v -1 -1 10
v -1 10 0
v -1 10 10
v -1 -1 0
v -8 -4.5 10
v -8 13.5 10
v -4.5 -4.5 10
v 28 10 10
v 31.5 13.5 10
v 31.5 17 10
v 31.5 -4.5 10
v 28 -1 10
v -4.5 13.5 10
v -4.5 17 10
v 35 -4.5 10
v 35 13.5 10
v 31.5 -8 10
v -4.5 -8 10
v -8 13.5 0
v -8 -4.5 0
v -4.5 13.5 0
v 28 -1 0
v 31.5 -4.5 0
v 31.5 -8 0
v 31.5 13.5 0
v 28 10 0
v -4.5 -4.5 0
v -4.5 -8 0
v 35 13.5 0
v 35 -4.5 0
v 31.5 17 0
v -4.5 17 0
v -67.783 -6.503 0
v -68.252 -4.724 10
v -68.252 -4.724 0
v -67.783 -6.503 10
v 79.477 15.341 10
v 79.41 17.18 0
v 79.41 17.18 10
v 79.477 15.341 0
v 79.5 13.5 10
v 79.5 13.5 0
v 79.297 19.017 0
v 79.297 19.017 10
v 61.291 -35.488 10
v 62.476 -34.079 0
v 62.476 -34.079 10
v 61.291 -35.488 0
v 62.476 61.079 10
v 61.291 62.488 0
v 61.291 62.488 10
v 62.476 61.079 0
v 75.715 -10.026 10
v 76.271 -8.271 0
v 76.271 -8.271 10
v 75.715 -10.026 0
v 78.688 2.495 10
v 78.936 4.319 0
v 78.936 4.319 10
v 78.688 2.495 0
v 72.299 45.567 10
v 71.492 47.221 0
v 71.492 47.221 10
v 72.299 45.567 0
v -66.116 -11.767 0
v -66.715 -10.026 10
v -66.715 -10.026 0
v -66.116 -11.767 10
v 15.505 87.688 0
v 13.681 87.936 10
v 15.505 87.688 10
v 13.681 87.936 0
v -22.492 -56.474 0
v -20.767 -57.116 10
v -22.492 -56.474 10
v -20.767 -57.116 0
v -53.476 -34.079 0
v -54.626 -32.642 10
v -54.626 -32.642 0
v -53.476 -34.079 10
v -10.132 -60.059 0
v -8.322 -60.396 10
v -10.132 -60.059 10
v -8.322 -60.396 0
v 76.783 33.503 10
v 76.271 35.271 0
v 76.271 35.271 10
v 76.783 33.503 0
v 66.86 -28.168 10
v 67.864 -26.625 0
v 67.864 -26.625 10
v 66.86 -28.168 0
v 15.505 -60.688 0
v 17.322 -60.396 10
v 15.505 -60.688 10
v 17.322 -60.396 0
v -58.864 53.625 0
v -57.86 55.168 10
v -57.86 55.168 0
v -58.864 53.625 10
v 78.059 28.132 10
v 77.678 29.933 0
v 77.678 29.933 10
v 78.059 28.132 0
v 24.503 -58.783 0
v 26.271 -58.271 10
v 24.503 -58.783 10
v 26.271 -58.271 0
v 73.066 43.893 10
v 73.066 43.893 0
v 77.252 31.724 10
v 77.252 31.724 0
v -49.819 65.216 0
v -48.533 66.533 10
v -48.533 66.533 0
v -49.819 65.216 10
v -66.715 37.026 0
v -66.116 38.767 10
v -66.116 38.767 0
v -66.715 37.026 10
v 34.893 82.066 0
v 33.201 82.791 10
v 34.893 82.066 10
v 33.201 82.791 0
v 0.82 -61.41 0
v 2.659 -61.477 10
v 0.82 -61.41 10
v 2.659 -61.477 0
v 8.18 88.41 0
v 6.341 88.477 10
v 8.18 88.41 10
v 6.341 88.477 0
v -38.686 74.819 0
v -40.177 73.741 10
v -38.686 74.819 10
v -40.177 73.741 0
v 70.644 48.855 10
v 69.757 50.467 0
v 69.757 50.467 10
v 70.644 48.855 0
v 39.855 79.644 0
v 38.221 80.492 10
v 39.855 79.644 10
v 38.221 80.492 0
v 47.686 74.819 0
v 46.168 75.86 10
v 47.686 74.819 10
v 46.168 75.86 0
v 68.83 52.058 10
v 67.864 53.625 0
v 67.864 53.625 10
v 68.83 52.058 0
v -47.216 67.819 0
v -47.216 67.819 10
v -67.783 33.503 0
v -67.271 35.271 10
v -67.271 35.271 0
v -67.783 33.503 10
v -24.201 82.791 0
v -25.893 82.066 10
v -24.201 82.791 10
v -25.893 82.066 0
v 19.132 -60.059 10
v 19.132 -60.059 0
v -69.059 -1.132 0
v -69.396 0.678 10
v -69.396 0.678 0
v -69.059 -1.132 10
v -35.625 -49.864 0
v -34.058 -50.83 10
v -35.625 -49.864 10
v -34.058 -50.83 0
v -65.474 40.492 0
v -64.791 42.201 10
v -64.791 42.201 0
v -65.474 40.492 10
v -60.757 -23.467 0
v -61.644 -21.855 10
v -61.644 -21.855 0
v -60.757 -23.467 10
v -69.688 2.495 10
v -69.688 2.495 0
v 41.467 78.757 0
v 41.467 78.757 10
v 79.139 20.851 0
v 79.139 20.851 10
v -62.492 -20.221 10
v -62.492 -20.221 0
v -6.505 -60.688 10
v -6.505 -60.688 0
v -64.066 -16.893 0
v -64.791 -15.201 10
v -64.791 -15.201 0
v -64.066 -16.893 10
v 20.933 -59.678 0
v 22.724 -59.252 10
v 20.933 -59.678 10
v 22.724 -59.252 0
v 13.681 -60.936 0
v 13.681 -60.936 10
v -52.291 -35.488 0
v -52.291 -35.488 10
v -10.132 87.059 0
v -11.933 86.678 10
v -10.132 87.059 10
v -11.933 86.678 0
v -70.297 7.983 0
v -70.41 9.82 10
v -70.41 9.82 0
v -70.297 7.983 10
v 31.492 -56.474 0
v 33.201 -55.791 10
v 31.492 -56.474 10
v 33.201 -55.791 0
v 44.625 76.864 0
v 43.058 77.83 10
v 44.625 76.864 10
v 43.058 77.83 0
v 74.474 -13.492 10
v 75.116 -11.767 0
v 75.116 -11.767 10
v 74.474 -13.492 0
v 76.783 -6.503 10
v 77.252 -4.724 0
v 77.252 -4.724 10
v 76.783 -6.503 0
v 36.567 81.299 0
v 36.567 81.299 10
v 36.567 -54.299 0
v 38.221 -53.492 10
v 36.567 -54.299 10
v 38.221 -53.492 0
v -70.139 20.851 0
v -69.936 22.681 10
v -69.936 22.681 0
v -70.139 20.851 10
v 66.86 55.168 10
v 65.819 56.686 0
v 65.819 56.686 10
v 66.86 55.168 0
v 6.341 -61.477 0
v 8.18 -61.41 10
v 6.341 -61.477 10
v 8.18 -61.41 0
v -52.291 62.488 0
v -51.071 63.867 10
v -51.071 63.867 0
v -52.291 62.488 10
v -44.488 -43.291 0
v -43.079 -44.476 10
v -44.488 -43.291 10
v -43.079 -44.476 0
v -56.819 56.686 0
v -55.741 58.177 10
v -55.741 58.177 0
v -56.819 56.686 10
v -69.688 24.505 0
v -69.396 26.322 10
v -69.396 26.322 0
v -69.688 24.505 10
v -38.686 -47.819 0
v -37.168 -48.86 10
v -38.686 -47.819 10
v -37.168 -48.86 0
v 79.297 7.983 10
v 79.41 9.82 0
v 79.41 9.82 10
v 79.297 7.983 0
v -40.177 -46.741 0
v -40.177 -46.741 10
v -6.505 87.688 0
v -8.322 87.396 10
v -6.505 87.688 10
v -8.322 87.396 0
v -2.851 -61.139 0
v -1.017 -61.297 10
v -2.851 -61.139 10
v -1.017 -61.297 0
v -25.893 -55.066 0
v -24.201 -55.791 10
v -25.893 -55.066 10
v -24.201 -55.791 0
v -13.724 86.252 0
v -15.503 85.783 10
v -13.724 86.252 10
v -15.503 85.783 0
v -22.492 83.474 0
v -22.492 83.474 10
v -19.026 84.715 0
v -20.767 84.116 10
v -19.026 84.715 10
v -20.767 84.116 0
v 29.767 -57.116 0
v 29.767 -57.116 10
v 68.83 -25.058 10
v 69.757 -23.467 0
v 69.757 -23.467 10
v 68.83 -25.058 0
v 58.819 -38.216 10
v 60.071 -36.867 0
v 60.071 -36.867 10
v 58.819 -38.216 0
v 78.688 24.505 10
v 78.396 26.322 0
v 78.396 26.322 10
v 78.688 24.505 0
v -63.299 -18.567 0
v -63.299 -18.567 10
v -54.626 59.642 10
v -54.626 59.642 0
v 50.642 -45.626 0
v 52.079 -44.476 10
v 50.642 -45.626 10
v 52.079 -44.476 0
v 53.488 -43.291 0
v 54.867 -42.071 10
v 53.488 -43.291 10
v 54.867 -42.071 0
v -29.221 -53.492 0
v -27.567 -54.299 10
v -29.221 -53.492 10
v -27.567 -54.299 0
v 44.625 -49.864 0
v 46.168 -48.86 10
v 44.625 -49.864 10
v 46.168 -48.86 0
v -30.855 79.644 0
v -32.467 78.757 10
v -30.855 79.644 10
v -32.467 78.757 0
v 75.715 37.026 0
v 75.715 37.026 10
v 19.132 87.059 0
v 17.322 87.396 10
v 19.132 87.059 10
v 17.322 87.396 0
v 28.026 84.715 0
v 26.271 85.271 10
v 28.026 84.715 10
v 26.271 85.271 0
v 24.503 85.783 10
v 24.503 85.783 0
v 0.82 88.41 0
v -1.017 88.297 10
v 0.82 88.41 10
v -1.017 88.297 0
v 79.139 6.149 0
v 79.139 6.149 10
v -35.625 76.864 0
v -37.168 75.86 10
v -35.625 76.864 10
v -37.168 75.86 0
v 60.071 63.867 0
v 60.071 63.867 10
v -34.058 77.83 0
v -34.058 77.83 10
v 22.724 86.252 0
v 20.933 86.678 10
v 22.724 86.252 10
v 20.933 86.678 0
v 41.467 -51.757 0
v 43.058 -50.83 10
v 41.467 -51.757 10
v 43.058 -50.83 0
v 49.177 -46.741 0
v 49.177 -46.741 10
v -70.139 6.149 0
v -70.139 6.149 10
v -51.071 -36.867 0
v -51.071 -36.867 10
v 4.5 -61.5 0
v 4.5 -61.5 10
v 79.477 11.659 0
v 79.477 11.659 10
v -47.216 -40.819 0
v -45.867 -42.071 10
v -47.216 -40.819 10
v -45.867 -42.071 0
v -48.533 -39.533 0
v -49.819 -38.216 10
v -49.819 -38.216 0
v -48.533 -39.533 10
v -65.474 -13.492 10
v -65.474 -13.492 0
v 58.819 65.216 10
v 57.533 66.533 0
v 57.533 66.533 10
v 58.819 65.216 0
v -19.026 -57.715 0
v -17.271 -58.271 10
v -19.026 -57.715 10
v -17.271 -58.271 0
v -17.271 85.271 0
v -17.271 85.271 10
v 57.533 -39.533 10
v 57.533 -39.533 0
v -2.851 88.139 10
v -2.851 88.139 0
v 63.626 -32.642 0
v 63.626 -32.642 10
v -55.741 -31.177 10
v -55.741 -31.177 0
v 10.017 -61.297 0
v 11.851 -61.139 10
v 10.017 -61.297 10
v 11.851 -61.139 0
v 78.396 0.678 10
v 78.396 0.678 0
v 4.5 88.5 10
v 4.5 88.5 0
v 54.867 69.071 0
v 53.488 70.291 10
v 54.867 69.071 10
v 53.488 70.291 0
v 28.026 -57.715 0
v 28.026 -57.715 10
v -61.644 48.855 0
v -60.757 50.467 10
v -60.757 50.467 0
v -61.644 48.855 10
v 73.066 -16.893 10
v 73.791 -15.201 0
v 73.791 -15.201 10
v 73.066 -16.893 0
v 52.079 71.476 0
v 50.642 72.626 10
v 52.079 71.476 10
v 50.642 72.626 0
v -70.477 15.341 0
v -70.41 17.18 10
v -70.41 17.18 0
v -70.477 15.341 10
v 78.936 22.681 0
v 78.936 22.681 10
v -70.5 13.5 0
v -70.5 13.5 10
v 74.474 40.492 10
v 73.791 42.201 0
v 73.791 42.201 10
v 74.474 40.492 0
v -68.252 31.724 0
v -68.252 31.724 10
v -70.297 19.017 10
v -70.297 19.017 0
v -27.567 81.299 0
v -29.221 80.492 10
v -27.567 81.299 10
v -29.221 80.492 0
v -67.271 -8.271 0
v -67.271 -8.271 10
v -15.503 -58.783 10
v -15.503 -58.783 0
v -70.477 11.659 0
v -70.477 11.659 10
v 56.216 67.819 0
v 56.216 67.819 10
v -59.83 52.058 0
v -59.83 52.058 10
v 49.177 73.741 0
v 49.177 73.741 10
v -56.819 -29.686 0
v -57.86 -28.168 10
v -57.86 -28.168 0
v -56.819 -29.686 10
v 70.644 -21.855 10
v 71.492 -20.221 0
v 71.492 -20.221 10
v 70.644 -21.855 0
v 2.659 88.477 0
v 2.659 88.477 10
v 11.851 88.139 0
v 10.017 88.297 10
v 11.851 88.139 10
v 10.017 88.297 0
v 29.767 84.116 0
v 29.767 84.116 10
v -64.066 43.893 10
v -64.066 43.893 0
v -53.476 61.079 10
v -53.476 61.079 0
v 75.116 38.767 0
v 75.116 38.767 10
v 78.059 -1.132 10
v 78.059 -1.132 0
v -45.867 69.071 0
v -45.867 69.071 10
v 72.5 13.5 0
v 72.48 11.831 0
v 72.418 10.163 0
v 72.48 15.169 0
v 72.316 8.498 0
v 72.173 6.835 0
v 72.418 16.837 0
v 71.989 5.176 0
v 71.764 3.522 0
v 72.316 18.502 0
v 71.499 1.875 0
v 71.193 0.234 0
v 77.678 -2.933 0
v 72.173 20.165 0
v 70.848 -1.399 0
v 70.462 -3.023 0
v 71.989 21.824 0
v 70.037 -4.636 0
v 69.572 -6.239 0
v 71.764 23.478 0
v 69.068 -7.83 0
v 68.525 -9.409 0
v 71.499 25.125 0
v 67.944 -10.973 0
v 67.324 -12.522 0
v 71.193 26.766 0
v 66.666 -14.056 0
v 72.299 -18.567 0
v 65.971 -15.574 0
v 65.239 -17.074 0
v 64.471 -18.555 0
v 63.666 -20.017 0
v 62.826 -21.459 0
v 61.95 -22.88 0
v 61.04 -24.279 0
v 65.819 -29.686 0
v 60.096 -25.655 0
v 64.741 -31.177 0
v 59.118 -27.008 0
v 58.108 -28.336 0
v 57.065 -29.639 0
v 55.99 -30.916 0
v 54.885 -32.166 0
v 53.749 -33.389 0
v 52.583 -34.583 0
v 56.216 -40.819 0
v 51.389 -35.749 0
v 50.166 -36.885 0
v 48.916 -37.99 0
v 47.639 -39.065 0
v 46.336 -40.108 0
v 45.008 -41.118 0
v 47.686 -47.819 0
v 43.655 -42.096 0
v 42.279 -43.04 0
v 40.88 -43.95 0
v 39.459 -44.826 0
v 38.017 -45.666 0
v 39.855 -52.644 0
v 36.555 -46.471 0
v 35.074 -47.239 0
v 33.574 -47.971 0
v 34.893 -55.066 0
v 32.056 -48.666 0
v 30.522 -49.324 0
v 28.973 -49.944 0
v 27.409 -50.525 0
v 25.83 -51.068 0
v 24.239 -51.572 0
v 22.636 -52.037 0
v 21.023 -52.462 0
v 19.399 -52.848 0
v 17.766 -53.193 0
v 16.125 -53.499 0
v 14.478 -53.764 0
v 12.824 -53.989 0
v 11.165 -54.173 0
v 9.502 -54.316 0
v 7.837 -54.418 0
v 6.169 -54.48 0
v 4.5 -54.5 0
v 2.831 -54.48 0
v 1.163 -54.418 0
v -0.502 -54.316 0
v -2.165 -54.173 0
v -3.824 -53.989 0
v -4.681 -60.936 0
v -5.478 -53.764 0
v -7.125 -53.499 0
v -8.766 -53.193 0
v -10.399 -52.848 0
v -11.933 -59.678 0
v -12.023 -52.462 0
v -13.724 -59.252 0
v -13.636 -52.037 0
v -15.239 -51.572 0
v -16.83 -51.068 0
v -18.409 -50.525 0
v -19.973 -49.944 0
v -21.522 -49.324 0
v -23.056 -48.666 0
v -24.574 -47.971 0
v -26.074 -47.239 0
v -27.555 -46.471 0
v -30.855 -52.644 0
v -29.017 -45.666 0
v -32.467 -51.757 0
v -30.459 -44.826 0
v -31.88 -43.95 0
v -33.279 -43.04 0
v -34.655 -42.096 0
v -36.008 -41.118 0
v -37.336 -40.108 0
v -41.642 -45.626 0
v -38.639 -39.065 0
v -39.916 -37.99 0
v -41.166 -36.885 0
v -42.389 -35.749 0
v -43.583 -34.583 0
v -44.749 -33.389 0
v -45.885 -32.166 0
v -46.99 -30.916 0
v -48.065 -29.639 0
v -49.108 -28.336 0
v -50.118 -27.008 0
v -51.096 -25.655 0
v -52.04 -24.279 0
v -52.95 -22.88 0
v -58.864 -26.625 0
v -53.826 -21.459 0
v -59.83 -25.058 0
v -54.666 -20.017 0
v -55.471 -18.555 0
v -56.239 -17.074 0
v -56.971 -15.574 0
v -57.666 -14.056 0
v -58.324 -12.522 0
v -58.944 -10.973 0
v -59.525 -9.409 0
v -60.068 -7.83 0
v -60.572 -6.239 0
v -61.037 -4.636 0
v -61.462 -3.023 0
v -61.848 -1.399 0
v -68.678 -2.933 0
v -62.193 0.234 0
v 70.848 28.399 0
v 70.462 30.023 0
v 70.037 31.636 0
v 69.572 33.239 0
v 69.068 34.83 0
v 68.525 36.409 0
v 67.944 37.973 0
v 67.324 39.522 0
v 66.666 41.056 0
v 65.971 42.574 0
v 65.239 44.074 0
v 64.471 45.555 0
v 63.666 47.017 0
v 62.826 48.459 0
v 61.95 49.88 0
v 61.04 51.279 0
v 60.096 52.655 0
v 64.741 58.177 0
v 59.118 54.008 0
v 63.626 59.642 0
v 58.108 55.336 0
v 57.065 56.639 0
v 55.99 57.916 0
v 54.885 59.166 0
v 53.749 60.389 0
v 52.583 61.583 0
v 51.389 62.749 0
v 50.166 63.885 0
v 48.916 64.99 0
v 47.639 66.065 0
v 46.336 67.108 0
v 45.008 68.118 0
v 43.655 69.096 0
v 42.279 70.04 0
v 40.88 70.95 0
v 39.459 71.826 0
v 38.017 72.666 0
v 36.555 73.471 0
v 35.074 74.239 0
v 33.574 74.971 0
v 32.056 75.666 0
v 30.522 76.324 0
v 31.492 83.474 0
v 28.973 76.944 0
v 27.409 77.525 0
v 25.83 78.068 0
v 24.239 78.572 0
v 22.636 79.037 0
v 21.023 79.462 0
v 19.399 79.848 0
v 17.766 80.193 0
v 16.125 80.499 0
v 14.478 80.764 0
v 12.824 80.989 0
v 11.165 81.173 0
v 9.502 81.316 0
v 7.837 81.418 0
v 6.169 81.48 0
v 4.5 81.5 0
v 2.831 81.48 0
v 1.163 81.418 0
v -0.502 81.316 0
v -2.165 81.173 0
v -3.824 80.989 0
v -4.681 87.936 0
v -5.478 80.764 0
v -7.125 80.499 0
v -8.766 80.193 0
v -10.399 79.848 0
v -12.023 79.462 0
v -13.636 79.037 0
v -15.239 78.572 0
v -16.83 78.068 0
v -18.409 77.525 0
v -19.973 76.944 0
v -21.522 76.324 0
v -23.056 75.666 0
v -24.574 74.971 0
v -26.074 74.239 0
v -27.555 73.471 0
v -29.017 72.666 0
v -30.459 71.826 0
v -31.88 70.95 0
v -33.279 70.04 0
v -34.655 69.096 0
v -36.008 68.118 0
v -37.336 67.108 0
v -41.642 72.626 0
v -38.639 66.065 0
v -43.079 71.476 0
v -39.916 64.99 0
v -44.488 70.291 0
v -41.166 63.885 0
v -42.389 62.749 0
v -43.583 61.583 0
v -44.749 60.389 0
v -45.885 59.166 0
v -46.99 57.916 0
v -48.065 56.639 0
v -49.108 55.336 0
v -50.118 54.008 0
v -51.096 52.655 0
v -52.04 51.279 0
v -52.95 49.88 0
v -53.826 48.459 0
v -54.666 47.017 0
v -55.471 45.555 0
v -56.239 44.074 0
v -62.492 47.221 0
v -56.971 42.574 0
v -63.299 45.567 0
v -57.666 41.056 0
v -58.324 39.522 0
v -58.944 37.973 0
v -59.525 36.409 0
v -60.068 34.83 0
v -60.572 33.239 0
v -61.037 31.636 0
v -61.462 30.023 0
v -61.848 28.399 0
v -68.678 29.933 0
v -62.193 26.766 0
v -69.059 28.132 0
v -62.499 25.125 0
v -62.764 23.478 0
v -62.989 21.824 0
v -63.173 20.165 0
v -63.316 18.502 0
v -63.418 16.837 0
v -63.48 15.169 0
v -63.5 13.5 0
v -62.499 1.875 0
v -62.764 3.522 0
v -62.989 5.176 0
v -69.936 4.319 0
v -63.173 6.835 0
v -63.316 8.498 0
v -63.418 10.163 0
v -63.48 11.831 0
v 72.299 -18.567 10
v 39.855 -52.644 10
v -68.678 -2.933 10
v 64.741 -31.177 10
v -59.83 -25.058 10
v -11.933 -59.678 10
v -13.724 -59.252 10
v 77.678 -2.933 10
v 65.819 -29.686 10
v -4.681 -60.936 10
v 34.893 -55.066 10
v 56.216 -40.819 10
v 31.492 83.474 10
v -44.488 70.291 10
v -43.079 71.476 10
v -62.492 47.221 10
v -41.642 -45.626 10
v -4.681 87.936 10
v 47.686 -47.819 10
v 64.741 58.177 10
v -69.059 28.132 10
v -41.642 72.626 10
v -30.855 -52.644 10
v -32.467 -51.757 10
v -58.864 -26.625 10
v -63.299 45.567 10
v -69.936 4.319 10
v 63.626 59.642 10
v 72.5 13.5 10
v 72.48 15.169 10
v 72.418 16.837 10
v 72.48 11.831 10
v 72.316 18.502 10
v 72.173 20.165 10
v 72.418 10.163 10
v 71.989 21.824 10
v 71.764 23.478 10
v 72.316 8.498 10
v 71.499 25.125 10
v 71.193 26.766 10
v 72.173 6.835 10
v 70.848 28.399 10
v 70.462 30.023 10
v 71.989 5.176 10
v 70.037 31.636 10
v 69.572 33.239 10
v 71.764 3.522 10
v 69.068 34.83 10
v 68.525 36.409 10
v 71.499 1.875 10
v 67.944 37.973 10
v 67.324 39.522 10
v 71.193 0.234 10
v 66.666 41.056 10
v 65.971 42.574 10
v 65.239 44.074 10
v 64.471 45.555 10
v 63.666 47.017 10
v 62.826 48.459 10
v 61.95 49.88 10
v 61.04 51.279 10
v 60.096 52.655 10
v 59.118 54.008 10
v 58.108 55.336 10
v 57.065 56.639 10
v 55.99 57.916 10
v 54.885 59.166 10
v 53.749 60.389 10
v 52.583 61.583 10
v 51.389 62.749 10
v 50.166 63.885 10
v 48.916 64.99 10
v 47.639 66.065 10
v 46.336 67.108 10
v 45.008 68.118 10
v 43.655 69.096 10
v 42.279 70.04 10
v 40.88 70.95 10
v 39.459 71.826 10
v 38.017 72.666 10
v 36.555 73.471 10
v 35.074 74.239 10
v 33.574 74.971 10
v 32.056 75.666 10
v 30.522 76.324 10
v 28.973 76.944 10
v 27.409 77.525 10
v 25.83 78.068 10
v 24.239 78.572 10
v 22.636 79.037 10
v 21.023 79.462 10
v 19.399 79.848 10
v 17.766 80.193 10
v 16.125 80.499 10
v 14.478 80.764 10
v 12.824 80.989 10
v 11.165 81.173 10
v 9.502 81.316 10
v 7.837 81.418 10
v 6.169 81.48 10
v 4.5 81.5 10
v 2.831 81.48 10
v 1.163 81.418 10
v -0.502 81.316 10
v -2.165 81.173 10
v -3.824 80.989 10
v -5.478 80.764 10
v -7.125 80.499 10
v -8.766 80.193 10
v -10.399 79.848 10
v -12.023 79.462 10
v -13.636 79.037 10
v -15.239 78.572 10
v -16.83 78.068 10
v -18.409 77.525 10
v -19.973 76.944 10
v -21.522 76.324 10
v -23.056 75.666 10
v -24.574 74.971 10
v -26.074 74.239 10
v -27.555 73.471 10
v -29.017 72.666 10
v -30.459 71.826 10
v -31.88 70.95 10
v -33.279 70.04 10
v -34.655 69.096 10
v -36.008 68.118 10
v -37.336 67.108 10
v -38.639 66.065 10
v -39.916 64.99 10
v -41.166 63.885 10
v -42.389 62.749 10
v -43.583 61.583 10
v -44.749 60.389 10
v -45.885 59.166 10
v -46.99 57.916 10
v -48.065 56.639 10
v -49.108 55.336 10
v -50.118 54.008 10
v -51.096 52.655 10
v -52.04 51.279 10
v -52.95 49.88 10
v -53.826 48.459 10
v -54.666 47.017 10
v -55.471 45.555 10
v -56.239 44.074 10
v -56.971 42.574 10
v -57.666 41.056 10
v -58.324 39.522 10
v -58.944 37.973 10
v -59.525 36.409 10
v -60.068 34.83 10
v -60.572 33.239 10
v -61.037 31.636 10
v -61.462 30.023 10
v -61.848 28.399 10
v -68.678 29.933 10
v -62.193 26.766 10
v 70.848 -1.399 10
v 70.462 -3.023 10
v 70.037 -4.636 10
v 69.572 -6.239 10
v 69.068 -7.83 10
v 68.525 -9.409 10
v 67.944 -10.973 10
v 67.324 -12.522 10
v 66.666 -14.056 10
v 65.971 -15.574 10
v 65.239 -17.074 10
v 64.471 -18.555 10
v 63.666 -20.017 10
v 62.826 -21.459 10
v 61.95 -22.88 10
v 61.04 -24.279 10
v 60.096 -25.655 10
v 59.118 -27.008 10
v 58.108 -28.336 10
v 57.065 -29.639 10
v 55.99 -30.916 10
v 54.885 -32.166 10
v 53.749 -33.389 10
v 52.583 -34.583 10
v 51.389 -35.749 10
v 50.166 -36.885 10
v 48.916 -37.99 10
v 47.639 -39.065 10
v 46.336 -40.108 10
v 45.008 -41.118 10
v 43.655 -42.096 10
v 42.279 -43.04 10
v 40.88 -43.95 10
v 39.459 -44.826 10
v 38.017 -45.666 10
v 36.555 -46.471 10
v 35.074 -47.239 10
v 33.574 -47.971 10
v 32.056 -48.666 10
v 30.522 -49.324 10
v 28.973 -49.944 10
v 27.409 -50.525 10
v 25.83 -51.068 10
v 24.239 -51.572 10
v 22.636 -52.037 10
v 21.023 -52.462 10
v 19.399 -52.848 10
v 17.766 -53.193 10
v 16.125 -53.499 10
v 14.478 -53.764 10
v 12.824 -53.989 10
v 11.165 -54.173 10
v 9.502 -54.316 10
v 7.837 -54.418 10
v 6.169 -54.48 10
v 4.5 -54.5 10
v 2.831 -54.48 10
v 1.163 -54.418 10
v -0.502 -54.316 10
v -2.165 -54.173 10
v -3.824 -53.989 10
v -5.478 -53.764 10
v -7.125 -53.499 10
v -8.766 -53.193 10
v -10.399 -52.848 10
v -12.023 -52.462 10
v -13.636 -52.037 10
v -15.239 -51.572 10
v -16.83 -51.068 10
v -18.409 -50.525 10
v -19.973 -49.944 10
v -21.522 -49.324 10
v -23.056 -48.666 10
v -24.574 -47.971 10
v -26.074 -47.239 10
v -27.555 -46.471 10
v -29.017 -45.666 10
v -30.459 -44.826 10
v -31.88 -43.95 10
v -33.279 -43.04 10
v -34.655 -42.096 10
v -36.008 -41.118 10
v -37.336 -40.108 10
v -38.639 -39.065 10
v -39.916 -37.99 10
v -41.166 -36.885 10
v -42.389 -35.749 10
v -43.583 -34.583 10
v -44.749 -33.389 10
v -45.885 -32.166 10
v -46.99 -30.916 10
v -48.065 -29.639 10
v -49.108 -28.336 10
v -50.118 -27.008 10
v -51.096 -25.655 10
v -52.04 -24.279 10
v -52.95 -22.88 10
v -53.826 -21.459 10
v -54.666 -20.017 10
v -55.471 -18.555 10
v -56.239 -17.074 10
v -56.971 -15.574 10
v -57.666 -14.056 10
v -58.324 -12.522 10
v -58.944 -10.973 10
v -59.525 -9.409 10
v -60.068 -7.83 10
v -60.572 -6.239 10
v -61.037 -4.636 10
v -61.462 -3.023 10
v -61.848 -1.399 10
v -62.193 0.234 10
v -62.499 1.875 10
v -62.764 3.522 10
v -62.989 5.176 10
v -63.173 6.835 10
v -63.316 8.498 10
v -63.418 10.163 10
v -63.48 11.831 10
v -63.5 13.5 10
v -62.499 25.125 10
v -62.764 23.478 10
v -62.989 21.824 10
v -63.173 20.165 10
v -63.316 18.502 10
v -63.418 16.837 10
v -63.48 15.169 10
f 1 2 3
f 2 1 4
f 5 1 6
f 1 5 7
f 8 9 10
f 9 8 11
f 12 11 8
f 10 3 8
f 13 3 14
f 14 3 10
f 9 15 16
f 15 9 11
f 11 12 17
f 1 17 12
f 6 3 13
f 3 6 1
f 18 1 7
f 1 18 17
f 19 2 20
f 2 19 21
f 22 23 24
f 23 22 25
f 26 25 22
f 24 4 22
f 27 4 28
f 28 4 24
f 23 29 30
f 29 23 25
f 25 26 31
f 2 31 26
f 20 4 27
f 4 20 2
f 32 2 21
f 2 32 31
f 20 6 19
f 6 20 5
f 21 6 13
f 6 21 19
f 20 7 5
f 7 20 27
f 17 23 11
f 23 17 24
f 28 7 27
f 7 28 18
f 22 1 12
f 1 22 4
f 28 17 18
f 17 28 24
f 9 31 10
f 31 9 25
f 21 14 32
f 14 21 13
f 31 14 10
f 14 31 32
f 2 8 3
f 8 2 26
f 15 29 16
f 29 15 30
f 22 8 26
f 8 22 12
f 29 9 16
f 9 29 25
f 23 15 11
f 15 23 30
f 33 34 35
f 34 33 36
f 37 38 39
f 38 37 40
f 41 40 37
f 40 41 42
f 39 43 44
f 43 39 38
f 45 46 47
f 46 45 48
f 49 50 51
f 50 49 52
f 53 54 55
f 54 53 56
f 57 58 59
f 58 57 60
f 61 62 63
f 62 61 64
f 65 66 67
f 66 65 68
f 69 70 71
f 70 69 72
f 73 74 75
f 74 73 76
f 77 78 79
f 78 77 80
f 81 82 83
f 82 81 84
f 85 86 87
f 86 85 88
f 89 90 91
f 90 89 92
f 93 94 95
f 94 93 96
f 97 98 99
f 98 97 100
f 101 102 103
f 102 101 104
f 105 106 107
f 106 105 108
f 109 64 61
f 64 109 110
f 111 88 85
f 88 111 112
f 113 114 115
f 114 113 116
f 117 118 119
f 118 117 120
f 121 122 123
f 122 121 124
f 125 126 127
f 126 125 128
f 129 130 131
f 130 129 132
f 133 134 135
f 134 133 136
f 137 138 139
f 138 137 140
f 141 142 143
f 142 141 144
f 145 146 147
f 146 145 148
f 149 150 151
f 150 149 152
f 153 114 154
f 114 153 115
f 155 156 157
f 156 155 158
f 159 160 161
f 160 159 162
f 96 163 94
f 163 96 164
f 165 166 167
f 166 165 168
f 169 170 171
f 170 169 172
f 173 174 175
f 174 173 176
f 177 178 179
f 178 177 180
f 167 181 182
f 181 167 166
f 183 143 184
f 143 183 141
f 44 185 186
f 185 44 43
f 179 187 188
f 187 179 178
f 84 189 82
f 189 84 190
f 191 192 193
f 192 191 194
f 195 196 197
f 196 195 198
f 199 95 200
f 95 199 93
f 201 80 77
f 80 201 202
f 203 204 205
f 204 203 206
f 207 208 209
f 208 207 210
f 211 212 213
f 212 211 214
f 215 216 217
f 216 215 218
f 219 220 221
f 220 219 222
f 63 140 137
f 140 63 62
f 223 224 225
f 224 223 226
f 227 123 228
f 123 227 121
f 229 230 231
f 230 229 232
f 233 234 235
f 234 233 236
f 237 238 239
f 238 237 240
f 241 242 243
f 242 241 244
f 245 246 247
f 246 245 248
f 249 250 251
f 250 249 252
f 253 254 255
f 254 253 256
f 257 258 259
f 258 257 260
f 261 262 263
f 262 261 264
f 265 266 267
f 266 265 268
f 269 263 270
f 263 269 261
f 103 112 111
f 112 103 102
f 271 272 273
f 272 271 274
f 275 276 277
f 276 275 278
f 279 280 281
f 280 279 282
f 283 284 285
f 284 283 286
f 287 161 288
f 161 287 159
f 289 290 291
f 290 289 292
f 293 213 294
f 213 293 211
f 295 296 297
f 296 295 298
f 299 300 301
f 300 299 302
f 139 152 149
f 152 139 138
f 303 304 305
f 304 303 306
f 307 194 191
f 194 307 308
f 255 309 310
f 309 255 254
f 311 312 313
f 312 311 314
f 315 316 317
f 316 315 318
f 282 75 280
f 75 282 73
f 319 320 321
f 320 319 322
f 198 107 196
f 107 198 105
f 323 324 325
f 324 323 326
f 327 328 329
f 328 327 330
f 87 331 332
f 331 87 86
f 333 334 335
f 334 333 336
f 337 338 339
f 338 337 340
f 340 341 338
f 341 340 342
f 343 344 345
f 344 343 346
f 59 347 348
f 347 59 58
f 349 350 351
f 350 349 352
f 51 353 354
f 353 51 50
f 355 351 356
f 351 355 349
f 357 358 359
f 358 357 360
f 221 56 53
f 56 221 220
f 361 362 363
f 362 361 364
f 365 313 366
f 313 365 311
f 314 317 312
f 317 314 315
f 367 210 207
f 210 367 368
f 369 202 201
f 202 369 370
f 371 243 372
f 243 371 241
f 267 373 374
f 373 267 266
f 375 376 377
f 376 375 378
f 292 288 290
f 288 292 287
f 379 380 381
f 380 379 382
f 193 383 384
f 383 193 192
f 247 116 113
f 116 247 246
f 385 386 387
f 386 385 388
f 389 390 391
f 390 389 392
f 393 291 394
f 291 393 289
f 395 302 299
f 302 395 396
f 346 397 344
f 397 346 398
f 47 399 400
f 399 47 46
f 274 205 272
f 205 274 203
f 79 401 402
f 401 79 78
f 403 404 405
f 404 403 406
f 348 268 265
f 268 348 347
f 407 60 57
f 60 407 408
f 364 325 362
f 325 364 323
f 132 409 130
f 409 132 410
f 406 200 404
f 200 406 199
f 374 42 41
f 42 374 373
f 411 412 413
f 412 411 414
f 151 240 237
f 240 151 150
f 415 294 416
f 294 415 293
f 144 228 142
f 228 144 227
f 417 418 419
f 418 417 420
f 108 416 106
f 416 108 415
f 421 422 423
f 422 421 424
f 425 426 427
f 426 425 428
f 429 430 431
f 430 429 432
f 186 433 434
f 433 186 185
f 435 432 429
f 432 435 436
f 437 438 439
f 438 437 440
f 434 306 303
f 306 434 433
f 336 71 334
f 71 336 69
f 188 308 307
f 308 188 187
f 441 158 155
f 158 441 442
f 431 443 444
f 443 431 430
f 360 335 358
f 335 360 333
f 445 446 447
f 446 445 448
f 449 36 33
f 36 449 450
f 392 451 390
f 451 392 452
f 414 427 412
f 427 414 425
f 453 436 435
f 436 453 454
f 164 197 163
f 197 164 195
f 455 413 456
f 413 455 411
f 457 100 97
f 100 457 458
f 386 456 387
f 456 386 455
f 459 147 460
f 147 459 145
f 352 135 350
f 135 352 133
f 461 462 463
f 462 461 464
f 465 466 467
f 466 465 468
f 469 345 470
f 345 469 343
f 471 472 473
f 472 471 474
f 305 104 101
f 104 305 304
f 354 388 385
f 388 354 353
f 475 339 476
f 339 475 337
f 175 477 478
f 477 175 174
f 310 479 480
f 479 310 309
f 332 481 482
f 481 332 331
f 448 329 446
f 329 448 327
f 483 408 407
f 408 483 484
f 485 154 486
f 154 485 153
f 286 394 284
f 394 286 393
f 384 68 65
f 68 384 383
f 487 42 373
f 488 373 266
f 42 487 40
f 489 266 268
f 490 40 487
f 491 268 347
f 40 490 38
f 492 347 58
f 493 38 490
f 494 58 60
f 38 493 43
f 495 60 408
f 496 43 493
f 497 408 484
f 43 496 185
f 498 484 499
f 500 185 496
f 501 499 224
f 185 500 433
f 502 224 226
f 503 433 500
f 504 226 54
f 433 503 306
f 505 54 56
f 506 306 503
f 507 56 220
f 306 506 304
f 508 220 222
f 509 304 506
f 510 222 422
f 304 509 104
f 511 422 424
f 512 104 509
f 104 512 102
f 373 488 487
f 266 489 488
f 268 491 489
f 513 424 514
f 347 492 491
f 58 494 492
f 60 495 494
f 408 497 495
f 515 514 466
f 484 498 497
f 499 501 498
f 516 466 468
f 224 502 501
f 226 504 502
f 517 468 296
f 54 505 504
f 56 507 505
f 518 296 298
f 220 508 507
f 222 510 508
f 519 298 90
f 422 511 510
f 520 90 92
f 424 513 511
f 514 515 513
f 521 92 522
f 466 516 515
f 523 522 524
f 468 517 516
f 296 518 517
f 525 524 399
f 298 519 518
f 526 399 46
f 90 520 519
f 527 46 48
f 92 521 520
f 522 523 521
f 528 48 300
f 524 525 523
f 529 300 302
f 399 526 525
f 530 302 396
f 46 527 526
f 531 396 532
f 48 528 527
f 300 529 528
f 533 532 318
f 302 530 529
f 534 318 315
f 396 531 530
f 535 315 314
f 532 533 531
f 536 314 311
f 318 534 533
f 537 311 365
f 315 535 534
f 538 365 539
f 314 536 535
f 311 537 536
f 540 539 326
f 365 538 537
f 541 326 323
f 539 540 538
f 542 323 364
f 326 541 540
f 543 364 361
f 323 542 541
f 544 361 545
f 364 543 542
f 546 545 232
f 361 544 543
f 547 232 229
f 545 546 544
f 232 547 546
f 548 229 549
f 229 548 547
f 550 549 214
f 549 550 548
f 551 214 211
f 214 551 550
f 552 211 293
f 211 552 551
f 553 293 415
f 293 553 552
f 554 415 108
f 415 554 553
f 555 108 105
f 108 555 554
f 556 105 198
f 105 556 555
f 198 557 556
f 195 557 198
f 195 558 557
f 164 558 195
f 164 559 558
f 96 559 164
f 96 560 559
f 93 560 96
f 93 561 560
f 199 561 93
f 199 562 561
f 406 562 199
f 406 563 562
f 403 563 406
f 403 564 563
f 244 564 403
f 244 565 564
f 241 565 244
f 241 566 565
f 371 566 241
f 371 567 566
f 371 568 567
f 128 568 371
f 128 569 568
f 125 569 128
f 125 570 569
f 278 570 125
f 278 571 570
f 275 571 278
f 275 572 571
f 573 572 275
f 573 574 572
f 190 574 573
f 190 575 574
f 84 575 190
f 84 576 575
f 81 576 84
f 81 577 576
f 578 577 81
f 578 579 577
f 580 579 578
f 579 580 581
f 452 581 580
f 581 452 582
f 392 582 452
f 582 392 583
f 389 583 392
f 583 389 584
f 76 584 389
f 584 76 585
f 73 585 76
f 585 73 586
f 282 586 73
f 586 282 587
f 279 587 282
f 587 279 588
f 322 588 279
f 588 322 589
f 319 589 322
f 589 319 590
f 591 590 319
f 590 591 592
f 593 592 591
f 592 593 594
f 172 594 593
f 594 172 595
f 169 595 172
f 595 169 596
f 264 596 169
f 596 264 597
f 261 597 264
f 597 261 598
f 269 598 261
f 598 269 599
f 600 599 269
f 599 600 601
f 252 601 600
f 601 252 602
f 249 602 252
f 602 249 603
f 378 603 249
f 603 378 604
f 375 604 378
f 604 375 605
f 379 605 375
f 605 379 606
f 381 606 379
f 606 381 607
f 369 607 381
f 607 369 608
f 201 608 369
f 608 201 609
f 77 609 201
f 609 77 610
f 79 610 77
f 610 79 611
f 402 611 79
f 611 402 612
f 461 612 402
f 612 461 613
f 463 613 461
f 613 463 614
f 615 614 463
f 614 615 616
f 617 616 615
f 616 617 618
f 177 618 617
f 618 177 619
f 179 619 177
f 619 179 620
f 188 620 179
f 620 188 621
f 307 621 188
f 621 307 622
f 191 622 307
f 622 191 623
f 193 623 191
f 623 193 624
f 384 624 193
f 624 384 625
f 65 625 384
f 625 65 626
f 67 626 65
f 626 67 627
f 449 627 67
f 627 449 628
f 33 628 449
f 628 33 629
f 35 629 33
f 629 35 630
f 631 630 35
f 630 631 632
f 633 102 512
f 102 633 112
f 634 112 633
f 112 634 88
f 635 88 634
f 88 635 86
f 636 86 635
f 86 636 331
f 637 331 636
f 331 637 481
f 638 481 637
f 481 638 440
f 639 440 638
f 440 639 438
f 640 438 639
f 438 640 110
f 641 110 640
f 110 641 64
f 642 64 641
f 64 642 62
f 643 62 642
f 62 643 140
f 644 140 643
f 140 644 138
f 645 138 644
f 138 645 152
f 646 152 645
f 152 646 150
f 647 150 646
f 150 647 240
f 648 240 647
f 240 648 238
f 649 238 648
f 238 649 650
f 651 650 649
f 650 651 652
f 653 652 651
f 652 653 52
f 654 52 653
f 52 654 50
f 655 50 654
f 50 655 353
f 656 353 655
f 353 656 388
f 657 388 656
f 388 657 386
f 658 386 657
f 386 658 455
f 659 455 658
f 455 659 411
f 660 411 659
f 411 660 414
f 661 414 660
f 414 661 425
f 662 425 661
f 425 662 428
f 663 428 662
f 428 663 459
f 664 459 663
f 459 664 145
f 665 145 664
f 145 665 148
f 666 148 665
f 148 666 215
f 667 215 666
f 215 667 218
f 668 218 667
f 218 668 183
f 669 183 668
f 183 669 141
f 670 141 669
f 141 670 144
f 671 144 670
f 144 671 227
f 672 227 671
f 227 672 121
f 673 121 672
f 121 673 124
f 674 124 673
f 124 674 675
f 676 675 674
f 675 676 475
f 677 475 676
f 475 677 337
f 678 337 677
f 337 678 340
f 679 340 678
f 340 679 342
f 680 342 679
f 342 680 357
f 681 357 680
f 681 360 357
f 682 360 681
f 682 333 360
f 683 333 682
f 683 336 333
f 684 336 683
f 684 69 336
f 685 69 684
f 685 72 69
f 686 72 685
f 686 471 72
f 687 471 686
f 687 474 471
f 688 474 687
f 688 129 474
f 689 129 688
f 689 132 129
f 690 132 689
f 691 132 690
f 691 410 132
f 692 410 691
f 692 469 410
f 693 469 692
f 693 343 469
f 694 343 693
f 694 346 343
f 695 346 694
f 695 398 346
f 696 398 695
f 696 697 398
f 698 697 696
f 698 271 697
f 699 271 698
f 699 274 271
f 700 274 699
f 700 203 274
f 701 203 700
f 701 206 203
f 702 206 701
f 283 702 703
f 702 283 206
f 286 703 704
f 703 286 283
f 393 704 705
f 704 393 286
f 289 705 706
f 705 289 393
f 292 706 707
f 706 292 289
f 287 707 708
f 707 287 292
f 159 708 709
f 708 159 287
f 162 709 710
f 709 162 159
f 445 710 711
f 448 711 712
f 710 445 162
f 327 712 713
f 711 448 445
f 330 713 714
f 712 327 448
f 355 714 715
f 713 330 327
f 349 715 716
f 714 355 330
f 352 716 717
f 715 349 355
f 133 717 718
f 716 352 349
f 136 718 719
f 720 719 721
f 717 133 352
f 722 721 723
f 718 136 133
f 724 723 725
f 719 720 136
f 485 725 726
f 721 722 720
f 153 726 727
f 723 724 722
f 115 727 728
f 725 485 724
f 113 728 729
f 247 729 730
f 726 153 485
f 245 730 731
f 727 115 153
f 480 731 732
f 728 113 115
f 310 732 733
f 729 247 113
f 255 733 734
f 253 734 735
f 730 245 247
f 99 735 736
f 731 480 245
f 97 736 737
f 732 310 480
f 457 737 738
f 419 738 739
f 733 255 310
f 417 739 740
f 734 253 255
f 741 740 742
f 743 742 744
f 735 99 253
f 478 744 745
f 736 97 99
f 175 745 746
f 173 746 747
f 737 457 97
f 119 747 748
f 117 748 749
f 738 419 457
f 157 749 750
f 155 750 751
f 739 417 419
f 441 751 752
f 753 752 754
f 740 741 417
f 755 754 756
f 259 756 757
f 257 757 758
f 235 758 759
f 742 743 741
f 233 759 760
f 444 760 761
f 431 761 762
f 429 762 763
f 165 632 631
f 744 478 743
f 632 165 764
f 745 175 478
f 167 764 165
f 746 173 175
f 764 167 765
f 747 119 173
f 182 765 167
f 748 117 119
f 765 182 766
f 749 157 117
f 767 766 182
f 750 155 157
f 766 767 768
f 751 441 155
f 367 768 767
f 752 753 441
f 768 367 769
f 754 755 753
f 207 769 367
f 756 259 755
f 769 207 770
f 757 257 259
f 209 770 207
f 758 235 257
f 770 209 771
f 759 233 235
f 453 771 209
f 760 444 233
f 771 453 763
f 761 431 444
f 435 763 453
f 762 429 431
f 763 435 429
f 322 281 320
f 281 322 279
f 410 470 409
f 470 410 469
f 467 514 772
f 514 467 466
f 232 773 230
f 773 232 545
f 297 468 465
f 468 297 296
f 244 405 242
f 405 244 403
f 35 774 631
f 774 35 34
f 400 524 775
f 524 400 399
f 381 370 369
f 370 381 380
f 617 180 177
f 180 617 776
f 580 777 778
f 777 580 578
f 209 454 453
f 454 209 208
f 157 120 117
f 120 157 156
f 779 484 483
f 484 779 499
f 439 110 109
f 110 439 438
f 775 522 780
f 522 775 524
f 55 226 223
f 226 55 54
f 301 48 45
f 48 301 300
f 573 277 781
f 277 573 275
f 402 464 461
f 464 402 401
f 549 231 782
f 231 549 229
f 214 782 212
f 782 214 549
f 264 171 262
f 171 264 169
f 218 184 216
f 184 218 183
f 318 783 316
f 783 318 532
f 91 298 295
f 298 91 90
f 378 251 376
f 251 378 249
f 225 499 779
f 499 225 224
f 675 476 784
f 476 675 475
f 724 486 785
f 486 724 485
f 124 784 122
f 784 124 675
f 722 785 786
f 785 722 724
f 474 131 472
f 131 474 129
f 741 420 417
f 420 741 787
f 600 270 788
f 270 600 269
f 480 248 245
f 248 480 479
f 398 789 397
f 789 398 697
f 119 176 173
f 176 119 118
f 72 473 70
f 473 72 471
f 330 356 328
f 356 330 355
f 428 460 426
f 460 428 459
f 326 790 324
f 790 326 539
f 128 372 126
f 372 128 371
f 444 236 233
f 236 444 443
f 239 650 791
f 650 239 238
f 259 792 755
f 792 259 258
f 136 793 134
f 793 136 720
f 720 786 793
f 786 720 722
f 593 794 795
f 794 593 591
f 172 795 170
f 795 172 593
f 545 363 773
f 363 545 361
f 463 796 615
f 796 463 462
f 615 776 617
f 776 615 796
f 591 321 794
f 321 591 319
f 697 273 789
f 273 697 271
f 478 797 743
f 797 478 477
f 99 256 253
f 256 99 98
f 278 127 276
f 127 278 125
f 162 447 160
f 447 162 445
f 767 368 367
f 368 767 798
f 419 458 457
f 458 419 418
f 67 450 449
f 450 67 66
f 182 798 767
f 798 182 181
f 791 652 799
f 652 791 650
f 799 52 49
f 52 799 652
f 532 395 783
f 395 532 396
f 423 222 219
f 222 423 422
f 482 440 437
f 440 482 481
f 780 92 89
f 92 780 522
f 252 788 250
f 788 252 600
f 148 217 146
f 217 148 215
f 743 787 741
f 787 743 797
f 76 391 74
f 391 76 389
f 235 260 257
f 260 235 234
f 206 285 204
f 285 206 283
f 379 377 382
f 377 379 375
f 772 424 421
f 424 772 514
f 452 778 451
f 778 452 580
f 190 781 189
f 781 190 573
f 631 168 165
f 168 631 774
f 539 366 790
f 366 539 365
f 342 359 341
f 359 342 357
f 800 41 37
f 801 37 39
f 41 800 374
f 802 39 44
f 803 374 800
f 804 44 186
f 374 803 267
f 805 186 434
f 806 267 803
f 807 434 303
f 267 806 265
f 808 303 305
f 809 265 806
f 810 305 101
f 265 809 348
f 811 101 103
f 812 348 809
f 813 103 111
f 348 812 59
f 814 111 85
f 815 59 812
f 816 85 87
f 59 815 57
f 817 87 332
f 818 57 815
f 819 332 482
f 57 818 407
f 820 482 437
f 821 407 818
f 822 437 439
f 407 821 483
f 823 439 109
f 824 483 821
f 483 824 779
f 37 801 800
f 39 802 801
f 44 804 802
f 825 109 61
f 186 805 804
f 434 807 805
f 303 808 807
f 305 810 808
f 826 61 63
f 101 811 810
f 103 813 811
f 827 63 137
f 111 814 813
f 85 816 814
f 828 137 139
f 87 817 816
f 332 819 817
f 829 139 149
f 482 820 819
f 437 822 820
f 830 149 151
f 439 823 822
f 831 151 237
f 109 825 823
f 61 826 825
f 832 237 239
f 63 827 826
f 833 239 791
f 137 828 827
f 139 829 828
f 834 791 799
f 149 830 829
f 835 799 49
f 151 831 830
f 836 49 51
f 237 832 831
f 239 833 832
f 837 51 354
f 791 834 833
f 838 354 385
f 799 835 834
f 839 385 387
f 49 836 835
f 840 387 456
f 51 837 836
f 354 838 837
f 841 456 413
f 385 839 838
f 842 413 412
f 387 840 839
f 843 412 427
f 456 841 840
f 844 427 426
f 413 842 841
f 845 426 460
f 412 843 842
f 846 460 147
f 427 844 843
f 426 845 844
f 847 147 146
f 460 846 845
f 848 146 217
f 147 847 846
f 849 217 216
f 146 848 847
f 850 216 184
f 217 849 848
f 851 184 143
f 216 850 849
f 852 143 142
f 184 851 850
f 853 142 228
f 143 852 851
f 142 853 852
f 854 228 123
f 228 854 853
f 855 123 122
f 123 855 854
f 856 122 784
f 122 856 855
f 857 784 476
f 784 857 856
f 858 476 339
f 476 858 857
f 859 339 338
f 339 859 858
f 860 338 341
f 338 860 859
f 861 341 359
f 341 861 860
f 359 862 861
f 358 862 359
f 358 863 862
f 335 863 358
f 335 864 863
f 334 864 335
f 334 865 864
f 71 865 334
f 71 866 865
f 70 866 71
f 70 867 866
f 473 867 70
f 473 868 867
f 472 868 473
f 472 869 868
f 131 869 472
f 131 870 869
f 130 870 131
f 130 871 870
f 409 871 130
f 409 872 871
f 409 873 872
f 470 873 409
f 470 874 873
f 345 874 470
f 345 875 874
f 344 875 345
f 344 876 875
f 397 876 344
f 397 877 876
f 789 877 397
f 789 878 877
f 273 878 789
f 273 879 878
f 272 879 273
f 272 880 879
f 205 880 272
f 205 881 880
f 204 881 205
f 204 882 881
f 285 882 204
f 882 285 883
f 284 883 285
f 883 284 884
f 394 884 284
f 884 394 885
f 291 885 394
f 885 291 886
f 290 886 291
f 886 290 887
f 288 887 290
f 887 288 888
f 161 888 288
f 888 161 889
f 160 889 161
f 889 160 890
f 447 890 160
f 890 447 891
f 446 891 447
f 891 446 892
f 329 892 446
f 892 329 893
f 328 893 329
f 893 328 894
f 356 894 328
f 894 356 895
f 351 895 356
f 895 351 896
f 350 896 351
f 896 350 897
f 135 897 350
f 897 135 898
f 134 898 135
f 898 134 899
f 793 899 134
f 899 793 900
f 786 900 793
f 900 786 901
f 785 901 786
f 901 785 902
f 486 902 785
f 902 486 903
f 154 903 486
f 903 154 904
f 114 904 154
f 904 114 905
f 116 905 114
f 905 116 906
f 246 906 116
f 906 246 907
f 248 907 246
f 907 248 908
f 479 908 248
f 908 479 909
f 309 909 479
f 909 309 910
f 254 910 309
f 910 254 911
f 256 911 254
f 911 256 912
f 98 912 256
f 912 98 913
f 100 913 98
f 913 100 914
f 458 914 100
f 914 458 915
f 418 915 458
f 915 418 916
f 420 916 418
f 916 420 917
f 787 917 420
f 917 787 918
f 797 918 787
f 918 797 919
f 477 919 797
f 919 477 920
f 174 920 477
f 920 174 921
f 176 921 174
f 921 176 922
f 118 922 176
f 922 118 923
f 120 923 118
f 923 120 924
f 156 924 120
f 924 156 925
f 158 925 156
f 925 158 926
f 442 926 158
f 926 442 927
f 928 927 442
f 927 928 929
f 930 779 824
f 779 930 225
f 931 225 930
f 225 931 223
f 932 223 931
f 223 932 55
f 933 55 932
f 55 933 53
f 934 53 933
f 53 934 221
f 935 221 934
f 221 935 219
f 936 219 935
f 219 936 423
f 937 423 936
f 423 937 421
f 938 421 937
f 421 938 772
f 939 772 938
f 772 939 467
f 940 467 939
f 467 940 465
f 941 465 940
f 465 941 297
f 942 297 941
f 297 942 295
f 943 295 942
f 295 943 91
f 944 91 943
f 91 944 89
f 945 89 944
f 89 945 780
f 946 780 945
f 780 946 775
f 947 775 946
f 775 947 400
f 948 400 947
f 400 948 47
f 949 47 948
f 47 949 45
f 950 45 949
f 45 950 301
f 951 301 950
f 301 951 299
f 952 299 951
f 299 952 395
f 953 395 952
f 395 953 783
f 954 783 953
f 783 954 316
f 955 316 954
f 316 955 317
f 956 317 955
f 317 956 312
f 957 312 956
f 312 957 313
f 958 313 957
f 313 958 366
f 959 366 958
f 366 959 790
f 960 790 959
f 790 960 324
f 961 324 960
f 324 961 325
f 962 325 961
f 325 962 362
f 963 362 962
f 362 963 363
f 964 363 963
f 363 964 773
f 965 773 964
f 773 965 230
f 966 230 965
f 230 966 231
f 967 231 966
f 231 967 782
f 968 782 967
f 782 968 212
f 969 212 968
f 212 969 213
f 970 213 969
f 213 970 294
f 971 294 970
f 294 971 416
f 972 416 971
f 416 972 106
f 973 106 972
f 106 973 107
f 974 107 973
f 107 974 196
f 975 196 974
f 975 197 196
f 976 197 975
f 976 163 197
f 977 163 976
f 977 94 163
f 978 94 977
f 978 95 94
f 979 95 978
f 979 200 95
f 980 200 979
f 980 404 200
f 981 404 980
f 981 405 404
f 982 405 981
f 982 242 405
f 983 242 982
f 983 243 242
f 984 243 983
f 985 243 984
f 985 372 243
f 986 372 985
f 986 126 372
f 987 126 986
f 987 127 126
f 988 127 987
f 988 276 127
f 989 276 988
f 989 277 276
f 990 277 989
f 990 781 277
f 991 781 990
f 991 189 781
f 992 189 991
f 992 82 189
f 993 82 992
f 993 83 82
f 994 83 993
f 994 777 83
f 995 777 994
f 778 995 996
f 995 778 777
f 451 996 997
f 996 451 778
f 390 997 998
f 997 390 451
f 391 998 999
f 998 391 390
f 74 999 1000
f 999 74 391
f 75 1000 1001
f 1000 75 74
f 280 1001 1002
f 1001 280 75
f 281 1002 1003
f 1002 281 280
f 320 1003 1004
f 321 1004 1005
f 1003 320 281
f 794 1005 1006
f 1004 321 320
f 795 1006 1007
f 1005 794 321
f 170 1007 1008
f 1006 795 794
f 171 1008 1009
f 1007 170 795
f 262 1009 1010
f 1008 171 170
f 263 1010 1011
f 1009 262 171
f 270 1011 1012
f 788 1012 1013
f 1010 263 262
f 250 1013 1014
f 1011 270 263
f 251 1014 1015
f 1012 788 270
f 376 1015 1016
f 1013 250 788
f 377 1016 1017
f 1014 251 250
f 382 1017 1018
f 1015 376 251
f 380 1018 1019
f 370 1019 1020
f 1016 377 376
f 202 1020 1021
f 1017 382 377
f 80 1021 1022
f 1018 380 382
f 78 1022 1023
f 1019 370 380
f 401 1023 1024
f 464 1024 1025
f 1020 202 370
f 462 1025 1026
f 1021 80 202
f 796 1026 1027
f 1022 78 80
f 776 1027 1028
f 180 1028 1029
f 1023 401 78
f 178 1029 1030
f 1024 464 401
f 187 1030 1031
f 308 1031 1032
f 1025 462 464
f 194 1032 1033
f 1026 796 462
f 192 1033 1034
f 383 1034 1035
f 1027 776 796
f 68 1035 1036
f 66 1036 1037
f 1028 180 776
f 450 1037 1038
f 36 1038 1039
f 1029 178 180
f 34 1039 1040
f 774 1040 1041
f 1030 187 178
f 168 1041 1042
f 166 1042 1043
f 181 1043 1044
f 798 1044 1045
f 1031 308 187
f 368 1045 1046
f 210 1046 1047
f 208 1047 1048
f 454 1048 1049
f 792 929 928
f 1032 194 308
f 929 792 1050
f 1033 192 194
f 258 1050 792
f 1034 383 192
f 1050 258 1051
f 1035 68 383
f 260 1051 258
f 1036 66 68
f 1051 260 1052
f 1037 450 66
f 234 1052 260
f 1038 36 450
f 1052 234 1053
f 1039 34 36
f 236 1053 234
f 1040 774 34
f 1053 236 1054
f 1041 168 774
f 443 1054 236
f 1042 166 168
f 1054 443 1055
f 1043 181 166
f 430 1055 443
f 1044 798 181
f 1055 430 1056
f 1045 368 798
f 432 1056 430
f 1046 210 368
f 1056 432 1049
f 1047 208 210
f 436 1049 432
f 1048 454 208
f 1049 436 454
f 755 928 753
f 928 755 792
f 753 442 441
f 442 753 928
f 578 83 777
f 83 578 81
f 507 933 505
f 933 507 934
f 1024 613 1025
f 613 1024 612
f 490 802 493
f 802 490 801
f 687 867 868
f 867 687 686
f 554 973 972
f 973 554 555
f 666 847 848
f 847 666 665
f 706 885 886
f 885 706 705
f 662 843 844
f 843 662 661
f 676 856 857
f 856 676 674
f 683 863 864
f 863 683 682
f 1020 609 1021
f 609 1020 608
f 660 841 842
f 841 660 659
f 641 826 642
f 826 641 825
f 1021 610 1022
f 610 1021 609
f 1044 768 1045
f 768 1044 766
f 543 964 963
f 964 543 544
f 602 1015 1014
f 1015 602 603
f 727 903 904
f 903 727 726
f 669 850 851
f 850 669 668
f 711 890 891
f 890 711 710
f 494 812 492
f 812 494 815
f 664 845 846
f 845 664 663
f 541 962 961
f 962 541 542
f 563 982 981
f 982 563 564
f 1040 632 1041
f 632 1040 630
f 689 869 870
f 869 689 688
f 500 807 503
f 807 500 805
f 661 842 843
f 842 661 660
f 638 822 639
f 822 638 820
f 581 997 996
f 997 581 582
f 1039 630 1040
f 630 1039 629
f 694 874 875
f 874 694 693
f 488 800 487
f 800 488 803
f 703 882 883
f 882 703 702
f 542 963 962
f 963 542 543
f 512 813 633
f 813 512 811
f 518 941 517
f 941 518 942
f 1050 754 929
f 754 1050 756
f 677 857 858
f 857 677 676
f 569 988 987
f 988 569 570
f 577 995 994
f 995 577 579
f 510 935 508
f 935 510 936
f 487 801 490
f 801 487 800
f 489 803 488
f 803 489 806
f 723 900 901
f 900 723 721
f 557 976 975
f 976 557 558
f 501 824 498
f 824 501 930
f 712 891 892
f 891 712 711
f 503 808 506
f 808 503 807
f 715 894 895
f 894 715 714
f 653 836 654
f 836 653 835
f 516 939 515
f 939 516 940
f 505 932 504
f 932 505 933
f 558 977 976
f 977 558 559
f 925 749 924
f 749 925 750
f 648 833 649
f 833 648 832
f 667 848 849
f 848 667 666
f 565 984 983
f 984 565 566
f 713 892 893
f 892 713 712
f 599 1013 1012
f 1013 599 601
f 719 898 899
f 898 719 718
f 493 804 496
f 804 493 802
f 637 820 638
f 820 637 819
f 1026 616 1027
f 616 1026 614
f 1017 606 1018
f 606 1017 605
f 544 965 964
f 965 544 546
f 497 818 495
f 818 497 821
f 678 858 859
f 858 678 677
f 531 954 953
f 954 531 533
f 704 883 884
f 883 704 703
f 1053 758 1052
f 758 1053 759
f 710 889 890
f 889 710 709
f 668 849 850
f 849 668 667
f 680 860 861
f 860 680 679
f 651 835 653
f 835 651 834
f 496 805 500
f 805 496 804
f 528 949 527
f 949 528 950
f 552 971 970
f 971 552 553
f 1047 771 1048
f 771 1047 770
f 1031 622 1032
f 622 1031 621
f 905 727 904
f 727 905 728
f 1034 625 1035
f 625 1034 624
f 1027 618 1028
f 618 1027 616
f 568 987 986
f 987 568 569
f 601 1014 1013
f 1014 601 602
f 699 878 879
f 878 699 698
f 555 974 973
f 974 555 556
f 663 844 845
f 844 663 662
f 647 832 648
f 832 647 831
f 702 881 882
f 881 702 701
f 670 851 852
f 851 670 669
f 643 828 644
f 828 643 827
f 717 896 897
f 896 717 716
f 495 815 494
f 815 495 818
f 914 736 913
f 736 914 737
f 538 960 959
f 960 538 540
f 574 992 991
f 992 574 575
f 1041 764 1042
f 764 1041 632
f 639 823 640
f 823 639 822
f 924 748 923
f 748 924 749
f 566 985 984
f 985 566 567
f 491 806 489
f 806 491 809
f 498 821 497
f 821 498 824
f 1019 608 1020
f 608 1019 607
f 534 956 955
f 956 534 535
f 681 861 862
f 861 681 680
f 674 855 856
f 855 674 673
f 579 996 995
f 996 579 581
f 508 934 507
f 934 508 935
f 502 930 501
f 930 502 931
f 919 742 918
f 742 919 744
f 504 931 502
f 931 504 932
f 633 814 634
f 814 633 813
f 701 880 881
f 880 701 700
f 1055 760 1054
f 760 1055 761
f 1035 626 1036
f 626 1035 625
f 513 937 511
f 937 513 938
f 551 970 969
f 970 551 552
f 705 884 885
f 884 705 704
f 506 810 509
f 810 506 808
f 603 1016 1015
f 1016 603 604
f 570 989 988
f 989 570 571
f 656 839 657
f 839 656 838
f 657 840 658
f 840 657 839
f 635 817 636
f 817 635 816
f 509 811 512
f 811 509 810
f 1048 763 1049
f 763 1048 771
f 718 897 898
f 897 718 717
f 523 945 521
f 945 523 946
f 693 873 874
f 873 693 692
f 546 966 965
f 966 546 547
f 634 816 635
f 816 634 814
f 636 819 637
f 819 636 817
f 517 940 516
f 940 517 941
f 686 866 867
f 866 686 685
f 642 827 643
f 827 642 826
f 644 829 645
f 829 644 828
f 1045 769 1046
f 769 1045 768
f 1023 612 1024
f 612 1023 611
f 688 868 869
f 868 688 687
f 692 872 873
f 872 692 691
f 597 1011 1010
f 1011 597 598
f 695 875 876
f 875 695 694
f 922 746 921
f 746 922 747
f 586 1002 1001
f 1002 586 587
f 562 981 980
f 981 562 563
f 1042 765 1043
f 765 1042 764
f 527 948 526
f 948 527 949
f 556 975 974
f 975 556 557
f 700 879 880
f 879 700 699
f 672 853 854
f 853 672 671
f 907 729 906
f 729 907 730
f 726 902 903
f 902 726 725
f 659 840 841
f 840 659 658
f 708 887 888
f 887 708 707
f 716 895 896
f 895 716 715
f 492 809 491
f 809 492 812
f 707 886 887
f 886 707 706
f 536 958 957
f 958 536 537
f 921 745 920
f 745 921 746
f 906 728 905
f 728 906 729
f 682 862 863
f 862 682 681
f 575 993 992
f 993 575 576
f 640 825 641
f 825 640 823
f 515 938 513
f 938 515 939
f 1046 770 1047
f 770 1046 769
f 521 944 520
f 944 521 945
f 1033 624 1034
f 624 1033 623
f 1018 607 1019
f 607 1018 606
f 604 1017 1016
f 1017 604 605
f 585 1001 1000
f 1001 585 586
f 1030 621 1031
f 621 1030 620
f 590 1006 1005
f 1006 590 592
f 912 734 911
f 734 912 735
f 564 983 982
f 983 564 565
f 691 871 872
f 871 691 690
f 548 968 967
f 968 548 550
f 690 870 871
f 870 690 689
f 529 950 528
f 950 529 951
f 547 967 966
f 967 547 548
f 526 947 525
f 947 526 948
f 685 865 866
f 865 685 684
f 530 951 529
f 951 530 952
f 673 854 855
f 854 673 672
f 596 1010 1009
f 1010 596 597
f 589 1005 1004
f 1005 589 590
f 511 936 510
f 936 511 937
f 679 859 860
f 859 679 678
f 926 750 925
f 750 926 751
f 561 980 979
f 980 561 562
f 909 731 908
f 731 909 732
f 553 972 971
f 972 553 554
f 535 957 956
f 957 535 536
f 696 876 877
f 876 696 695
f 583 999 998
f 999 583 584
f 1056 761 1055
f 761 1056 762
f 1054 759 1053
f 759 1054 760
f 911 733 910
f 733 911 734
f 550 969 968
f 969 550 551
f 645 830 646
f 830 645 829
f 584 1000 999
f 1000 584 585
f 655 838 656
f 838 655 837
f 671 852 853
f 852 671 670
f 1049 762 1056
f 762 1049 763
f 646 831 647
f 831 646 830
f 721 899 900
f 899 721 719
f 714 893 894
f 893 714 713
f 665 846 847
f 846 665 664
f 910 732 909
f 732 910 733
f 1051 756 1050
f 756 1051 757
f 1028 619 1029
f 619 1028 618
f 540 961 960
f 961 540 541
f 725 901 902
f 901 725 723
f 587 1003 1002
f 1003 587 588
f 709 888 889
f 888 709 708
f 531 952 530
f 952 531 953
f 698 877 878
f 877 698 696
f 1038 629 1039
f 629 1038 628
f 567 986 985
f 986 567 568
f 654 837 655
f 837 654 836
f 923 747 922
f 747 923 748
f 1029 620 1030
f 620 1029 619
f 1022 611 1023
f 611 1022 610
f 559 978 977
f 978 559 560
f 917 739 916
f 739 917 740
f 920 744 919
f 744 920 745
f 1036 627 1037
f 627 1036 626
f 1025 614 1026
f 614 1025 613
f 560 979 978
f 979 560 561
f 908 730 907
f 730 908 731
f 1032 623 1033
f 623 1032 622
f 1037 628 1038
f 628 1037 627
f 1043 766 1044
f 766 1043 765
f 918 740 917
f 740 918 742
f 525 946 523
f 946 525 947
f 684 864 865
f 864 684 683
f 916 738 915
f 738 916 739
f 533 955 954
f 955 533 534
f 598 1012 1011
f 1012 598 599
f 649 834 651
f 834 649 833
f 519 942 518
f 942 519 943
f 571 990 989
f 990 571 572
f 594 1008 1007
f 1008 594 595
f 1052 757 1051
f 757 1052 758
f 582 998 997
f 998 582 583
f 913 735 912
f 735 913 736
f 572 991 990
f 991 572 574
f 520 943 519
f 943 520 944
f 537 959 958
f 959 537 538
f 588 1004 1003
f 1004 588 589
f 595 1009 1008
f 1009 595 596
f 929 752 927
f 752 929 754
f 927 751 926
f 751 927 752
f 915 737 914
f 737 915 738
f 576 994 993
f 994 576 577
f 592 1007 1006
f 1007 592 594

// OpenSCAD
// Generated by SolidPython 1.1.3 on 2026-06-23 12:54:22


union() {
	union() {
		translate(v = [-4.5000000000, 4.5000000000, 5.0000000000]) {
			cube(center = true, size = [7, 18, 10]);
		}
		translate(v = [13.5000000000, -4.5000000000, 5.0000000000]) {
			cube(center = true, size = [36, 7, 10]);
		}
		translate(v = [0, 18]) {
			translate(v = [13.5000000000, -4.5000000000, 5.0000000000]) {
				cube(center = true, size = [36, 7, 10]);
			}
		}
		translate(v = [36, 0]) {
			translate(v = [-4.5000000000, 4.5000000000, 5.0000000000]) {
				cube(center = true, size = [7, 18, 10]);
			}
		}
	}
	translate(v = [4.5000000000, 13.5000000000]) {
		difference() {
			cylinder($fn = 256, h = 10, r = 75.0000000000);
			cylinder($fn = 256, h = 10, r = 68.0000000000);
		}
	}
}
/***********************************************
*********      SolidPython code:      **********
************************************************

"""SCAD file export functions.

This module provides functions for exporting OpenSCAD geometries to .scad files.
"""

from typing import Dict, Optional
from pathlib import Path
import solid

from .config import ExportConfiguration, FileNamingConfig


def export_scad(
    geometry: solid.OpenSCADObject, output_path: Path, header: Optional[str] = None
) -> Path:
    """Export geometry to SCAD file.

    Parameters
    ----------
    geometry : solid.OpenSCADObject
        Geometry to export.
    output_path : Path
        Output file path.
    header : str, optional
        Header comment to add to SCAD file.

    Returns
    -------
    Path
        Path to created SCAD file.

    Raises
    ------
    IOError
        If file cannot be written.

    Examples
    --------
    >>> from pathlib import Path
    >>> import solid
    >>>
    >>> geometry = solid.cube([10, 10, 10])
    >>> output_path = Path('output/device.scad')
    >>> export_scad(geometry, output_path)
    """
    # Ensure parent directory exists
    output_path.parent.mkdir(parents=True, exist_ok=True)

    # Render to file
    try:
        solid.scad_render_to_file(geometry, str(output_path))
    except Exception as e:
        raise IOError(f"Failed to write SCAD file to {output_path}: {e}")

    _normalize_scad_file(output_path)

    # Add header if provided
    if header:
        _add_header_to_scad(output_path, header)
        _normalize_scad_file(output_path)

    return output_path


def _normalize_scad_file(scad_path: Path) -> None:
    """Strip trailing whitespace from generated SCAD text."""
    content = scad_path.read_text()
    normalized = "\n".join(line.rstrip() for line in content.splitlines()) + "\n"
    if normalized != content:
        scad_path.write_text(normalized)


def export_multiple_scad(
    geometries: Dict[str, solid.OpenSCADObject],
    config: ExportConfiguration,
    naming_config: Optional[FileNamingConfig] = None,
) -> Dict[str, Path]:
    """Export multiple geometries to SCAD files.

    Parameters
    ----------
    geometries : dict
        Dictionary mapping prefixes to geometries.
        Keys are used as filename prefixes.
    config : ExportConfiguration
        Export configuration.
    naming_config : FileNamingConfig, optional
        File naming configuration.

    Returns
    -------
    dict
        Dictionary mapping prefixes to output paths.

    Examples
    --------
    >>> geometries = {
    ...     'wells': wells_geometry,
    ...     'channels': channels_geometry,
    ...     'device': device_geometry
    ... }
    >>> config = ExportConfiguration(output_directory=Path('output'))
    >>> paths = export_multiple_scad(geometries, config)
    """
    output_paths = {}

    for prefix, geometry in geometries.items():
        # Create naming config for this geometry
        if naming_config:
            file_config = FileNamingConfig(
                prefix=prefix,
                version=naming_config.version,
                grid_size=naming_config.grid_size,
                suffix=naming_config.suffix,
            )
        else:
            file_config = FileNamingConfig(prefix=prefix)

        # Generate filename
        filename = file_config.generate_filename("scad")
        output_path = config.get_output_path(filename)

        # Export
        export_scad(geometry, output_path)
        output_paths[prefix] = output_path

    return output_paths


def _add_header_to_scad(scad_path: Path, header: str):
    """Add header comment to existing SCAD file.

    Parameters
    ----------
    scad_path : Path
        Path to SCAD file.
    header : str
        Header text to add.
    """
    # Read existing content
    with open(scad_path, "r") as f:
        content = f.read()

    # Prepend header
    header_comment = f"// {header}\n\n"
    with open(scad_path, "w") as f:
        f.write(header_comment + content)


def generate_scad_header(
    device_name: str, version: Optional[str] = None, description: Optional[str] = None
) -> str:
    """Generate SCAD file header comment.

    Parameters
    ----------
    device_name : str
        Device name.
    version : str, optional
        Version string.
    description : str, optional
        Device description.

    Returns
    -------
    str
        Header comment text.

    Examples
    --------
    >>> header = generate_scad_header(
    ...     'Two Compartment Device',
    ...     version='v1',
    ...     description='96-well format with microchannels'
    ... )
    """
    lines = []
    lines.append("=" * 60)
    lines.append(f"Device: {device_name}")

    if version:
        lines.append(f"Version: {version}")

    if description:
        lines.append(f"Description: {description}")

    lines.append("Generated by OpenMFD")
    lines.append("=" * 60)

    return "\n".join(lines)


def validate_scad_file(scad_path: Path) -> bool:
    """Validate that SCAD file exists and is readable.

    Parameters
    ----------
    scad_path : Path
        Path to SCAD file.

    Returns
    -------
    bool
        True if file is valid, False otherwise.
    """
    if not scad_path.exists():
        return False

    if not scad_path.is_file():
        return False

    # Try to read file
    try:
        with open(scad_path, "r") as f:
            content = f.read()
        return len(content) > 0
    except Exception:
        return False


************************************************/
